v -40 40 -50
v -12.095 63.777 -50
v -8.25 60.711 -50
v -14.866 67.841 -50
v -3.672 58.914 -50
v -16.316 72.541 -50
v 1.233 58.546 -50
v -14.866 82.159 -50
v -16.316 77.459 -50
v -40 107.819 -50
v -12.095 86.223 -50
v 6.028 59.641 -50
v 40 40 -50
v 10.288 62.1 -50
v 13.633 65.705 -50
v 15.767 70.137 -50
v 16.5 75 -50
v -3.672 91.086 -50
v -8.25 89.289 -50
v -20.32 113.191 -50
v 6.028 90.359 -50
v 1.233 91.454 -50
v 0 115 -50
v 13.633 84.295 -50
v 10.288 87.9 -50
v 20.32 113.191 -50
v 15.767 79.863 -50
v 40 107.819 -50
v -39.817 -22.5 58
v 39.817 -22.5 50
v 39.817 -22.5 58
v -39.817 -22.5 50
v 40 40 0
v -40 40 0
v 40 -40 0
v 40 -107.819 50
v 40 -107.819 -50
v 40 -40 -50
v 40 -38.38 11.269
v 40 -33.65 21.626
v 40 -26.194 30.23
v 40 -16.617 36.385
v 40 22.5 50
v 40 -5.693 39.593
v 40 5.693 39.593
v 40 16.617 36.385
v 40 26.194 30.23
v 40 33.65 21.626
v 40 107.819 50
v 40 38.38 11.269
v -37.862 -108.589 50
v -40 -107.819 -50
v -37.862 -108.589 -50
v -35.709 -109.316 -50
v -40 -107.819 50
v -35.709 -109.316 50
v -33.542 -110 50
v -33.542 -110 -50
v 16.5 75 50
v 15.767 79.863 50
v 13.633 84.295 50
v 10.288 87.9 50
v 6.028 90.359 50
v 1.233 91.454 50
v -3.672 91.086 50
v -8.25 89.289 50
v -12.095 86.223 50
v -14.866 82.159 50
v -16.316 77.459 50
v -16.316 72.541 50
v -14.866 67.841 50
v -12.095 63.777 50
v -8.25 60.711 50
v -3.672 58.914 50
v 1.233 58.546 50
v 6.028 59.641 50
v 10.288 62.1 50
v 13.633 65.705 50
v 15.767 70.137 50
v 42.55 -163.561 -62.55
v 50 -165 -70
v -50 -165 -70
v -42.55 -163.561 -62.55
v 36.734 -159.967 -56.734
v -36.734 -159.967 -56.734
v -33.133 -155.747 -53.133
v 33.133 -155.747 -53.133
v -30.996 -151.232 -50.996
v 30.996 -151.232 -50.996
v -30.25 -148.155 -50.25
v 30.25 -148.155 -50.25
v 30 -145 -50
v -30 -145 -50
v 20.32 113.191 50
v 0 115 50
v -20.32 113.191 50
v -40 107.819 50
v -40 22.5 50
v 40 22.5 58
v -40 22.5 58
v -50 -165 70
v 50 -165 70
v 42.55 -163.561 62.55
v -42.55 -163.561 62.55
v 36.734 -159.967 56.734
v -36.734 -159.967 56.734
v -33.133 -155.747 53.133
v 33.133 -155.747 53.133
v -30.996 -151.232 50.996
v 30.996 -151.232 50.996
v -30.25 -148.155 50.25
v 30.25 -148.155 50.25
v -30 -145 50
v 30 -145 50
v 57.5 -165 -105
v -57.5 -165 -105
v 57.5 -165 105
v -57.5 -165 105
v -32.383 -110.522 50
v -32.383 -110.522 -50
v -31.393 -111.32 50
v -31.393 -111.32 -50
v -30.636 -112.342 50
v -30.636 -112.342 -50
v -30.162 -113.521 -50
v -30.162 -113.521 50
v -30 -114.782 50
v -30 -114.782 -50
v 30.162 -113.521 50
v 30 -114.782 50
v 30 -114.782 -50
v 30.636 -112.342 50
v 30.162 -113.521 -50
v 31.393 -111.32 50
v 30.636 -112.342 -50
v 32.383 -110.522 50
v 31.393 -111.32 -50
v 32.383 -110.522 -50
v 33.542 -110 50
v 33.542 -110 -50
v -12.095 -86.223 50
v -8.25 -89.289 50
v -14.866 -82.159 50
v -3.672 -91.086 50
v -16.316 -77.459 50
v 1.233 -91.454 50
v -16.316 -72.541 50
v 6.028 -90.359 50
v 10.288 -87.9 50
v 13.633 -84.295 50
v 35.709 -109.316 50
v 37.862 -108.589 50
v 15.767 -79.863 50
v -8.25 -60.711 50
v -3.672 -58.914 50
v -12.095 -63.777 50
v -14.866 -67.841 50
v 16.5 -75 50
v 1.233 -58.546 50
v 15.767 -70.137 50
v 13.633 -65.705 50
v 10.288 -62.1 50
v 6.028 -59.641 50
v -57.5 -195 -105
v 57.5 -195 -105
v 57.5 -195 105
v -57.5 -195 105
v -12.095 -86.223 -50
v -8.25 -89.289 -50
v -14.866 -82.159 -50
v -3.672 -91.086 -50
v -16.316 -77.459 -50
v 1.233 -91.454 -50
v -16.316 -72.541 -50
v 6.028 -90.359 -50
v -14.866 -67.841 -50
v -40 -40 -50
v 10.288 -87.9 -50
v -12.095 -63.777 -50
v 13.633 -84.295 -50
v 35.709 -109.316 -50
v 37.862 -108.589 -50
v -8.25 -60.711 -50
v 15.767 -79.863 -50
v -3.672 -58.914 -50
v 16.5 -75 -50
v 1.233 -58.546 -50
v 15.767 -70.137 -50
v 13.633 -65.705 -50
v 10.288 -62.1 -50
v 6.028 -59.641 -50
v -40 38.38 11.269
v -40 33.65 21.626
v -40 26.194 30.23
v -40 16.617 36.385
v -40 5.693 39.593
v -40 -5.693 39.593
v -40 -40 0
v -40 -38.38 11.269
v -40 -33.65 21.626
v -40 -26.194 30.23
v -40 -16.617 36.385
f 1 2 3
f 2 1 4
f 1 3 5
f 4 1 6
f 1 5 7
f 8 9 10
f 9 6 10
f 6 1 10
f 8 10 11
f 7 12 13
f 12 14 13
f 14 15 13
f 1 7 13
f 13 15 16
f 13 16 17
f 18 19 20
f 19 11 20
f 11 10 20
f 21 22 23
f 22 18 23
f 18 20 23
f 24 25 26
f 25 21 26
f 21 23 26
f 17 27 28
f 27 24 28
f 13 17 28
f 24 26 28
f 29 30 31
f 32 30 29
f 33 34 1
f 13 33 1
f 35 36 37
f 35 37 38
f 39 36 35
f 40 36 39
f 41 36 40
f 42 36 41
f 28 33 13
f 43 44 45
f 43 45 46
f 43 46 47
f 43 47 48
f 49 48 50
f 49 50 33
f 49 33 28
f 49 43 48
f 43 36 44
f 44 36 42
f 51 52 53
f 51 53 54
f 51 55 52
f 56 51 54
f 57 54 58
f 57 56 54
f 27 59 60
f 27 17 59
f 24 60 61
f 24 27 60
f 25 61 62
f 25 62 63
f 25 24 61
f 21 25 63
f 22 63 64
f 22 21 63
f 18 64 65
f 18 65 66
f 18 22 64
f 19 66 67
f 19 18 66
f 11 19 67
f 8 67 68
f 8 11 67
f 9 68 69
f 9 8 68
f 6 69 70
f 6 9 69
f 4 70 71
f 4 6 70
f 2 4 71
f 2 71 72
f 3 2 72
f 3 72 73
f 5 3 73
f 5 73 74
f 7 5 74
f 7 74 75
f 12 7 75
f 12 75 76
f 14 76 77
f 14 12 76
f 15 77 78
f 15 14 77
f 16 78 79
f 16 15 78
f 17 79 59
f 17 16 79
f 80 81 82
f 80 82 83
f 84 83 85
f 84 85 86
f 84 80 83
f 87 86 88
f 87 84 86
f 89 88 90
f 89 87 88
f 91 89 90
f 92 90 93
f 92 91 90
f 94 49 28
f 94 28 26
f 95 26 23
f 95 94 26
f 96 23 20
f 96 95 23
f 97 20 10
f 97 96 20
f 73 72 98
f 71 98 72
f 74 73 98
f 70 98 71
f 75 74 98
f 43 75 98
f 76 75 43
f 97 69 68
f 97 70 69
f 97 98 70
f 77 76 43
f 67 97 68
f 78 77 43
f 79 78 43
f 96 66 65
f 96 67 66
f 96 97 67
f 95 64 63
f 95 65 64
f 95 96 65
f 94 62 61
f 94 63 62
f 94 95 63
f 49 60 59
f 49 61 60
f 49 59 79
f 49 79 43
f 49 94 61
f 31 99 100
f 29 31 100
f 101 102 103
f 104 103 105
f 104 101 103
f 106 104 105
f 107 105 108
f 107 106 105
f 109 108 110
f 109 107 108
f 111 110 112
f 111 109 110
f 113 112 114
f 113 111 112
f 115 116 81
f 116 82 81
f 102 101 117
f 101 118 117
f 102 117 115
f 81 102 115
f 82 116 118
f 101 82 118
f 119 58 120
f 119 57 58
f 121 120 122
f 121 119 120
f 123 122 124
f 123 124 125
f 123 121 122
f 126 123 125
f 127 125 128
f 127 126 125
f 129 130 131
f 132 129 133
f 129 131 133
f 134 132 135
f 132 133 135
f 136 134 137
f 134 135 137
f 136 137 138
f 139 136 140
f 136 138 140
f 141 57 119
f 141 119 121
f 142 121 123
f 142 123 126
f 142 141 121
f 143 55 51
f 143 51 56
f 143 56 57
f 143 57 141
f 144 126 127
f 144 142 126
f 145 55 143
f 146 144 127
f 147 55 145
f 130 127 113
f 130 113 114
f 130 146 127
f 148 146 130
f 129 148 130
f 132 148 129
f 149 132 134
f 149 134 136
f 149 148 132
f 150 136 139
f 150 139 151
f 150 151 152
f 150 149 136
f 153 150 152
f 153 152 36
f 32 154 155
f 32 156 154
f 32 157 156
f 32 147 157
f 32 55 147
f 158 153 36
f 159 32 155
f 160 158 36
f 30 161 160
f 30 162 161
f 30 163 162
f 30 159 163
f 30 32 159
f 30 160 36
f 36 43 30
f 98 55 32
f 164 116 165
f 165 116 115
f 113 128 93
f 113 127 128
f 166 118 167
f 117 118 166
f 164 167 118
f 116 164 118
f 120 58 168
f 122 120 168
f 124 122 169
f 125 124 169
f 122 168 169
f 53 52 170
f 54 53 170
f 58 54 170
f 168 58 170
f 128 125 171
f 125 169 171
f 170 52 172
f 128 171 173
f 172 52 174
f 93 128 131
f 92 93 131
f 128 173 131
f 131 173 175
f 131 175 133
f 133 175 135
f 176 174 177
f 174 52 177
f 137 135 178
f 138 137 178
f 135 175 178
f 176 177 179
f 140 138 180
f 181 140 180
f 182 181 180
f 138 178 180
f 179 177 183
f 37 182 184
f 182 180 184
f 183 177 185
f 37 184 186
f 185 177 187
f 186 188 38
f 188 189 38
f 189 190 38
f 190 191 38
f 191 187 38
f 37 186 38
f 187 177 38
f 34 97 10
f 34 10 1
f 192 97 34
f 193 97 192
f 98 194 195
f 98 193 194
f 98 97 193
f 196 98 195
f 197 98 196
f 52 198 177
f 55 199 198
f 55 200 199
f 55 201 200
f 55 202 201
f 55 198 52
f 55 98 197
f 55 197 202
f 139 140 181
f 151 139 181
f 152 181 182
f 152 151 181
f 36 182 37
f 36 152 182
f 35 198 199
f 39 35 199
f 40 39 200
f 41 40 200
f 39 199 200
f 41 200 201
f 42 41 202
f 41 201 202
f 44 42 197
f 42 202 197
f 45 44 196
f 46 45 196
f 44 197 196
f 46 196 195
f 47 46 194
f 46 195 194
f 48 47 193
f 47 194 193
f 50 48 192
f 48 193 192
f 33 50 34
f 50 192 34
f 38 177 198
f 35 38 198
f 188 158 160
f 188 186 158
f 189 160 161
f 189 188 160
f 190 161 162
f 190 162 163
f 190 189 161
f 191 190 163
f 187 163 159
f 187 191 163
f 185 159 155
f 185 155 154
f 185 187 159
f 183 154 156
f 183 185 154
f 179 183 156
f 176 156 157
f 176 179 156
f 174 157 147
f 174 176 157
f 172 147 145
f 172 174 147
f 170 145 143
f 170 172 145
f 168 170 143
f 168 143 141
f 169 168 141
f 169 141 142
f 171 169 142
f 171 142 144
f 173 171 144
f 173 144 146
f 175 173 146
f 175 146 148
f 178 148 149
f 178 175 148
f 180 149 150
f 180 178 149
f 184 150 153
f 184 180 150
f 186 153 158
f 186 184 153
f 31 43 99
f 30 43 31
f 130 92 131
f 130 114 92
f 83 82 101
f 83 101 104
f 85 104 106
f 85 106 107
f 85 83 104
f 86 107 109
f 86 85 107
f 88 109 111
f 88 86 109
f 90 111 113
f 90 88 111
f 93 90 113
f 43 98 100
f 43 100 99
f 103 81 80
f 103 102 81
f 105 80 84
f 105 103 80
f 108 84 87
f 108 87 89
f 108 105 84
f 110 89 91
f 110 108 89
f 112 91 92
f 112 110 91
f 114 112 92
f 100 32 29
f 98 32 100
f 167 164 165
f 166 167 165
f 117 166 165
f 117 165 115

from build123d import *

# Parameters (mm, degrees)
SKETCH1_R           = 16.5
BOSS_EXTRUDE1_DEPTH = 50
SKETCH4_W           = 115
SKETCH4_H           = 30
BOSS_EXTRUDE2_DEPTH = 105
FILLET1_R           = 20
FILLET2_R           = 20
FILLET3_R           = 20
FILLET4_R           = 20
FILLET5_R           = 5
CUT_EXTRUDE2_DEPTH  = 138
BOSS_EXTRUDE4_DEPTH = 8


with BuildPart() as part:
    # Sketch1 → Boss-Extrude1 (new body, symmetric)
    with BuildSketch(Plane.XY):
        with BuildLine():
            Line((40, -107.819293264), (40, 0))
            Line((40, 0), (-40, 0))
            Line((-40, 0), (-40, -107.819293264))
            ThreePointArc((-40, -107.819293264), (-35.036523196, -109.532835453), (-30, -111.018016556))
            Line((-30, -111.018016556), (-30, -165))
            Line((-30, -165), (30, -165))
            Line((30, -165), (30, -111.018016556))
            ThreePointArc((30, -111.018016556), (35.036523196, -109.532835453), (40, -107.819293264))
        make_face()
        with Locations((0, -75)):
            Circle(SKETCH1_R, mode=Mode.SUBTRACT)
        with BuildLine():
            Line((-40, 0), (40, 0))
            Line((40, 0), (40, 107.819293264))
            ThreePointArc((40, 107.819293264), (0, 115), (-40, 107.819293264))
            Line((-40, 107.819293264), (-40, 0))
        make_face()
        with Locations((0, 75)):
            Circle(SKETCH1_R, mode=Mode.SUBTRACT)
    extrude(amount=BOSS_EXTRUDE1_DEPTH, both=True)

    # Sketch4 → Boss-Extrude2 (add, symmetric)
    with BuildSketch(Plane.XY):
        with Locations((0, -180)):
            Rectangle(SKETCH4_W, SKETCH4_H)
    extrude(amount=BOSS_EXTRUDE2_DEPTH, both=True)

    # Fillet1
    fillet1_edges = [part.edges().sort_by_distance(p)[0] for p in [
        (-30, -165, 0),
    ]]
    fillet(fillet1_edges, radius=FILLET1_R)

    # Fillet2
    fillet2_edges = [part.edges().sort_by_distance(p)[0] for p in [
        (0, -165, 50),
    ]]
    fillet(fillet2_edges, radius=FILLET2_R)

    # Fillet3
    fillet3_edges = [part.edges().sort_by_distance(p)[0] for p in [
        (0, -165, -50),
    ]]
    fillet(fillet3_edges, radius=FILLET3_R)

    # Fillet4
    fillet4_edges = [part.edges().sort_by_distance(p)[0] for p in [
        (30, -165, 0),
    ]]
    fillet(fillet4_edges, radius=FILLET4_R)

    # Fillet5
    fillet5_edges = [part.edges().sort_by_distance(p)[0] for p in [
        (-30, -111.018016556, 0),
        (30, -111.018016556, 0),
    ]]
    fillet(fillet5_edges, radius=FILLET5_R)

    # Sketch6 → Cut-Extrude2 (cut)
    with BuildSketch(Plane.ZY.offset(40)):
        with BuildLine():
            Line((0, 40), (-50, 40))
            Line((-50, 40), (-50, -40))
            Line((-50, -40), (0, -40))
            ThreePointArc((0, -40), (40, 0), (0, 40))
        make_face()
    extrude(amount=-CUT_EXTRUDE2_DEPTH, mode=Mode.SUBTRACT)

    # Sketch8 → Boss-Extrude4 (add)
    with BuildSketch(Plane.XY.offset(50)):
        Polygon((-39.81738938, -22.5), (-40, 22.5), (40, 22.5), (39.81738938, -22.5), align=None)
    extrude(amount=BOSS_EXTRUDE4_DEPTH)


solid = part.part
